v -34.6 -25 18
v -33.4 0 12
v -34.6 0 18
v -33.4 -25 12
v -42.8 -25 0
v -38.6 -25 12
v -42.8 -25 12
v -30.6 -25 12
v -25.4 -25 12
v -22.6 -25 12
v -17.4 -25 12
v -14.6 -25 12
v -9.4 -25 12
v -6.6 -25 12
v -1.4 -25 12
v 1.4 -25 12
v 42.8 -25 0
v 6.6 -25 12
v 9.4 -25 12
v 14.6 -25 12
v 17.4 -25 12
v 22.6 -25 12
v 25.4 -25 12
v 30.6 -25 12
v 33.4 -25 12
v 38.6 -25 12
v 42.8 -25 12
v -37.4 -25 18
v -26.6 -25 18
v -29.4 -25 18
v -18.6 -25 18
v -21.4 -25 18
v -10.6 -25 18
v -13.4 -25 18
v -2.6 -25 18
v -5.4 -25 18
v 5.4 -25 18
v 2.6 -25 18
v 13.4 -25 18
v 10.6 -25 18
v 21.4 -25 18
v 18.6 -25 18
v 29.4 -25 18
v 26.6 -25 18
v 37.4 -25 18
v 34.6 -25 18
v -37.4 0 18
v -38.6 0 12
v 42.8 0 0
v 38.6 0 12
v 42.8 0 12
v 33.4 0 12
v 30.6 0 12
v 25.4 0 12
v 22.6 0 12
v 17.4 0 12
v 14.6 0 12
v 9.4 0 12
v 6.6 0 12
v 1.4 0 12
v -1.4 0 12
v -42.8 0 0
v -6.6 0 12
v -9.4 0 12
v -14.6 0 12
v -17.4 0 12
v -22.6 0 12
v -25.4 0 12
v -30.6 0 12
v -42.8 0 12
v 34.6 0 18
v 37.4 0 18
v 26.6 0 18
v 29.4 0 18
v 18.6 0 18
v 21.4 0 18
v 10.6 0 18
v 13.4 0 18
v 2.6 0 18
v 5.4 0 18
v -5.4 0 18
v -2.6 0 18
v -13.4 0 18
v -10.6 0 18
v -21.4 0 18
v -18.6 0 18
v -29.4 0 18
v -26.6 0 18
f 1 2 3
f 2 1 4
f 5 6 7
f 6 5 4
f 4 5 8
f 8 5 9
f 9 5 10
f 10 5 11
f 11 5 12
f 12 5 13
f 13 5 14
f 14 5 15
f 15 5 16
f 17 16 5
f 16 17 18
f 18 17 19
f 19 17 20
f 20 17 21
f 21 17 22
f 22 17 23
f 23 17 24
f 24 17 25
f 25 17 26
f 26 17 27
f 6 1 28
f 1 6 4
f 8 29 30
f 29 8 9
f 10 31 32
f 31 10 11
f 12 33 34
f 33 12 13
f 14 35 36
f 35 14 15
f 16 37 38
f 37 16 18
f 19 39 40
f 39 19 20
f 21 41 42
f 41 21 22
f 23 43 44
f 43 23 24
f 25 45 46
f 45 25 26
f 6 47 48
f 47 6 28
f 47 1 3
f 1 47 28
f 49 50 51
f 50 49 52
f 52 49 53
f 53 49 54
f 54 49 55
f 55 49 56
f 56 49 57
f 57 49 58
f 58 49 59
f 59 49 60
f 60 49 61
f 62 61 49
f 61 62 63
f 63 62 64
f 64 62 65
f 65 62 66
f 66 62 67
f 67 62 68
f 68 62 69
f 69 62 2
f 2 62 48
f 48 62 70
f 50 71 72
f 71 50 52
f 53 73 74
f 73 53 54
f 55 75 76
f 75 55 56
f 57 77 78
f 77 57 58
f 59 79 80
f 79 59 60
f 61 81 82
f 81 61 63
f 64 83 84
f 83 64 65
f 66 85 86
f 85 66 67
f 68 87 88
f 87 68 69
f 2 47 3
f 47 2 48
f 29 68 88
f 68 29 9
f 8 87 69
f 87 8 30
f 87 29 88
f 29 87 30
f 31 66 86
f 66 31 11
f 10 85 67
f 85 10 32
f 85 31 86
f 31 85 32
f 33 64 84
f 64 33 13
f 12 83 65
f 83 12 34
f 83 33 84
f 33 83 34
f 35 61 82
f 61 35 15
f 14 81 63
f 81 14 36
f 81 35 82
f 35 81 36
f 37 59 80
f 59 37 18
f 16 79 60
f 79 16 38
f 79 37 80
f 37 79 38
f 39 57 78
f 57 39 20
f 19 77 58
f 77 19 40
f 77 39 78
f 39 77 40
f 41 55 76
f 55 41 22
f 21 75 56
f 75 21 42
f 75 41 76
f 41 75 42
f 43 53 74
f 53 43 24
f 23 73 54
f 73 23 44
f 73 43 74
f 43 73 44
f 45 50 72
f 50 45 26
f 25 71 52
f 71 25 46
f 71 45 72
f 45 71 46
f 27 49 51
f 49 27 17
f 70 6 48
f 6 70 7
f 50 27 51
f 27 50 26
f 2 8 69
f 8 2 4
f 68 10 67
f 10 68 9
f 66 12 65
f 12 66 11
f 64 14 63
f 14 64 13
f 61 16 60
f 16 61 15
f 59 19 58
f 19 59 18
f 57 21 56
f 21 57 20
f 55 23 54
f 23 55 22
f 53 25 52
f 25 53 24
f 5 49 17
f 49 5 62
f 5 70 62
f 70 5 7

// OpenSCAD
$fn = 32;

// ----------------------------------------------------------------------
// Toothed rack, 10 teeth
// 8 mm pitch, 6 mm teeth
// ----------------------------------------------------------------------

// --- parameters (mm) ---
bar_w = 25;      // bar width (Y)
seat_tol = 0.1;  // tolerance at the seating features
free_tol = 0.3;  // general tolerance on the free sizes
bar_h = 12;      // bar height (Z)
teeth = 10;      // number of teeth
pitch = 8;       // tooth pitch
tooth_h = 6;     // tooth height above the bar
root_w = 5.6;    // tooth width at the root
crest_w = 2.8;   // tooth width at the crest

// --- derived feature positions (mm) ---
span = (teeth - 1) * pitch;  // = 72   distance between the outer teeth
bar_l = span + root_w + 8;   // = 85.6   bar length: teeth plus 4 mm at each end
tooth_x = -span / 2;         // = -36   X of the first tooth
height = bar_h + tooth_h;    // = 18   overall height
feature_centers = [
  [tooth_x + 0 * pitch, -bar_w / 2],
  [tooth_x + 1 * pitch, -bar_w / 2],
  [tooth_x + 2 * pitch, -bar_w / 2],
  [tooth_x + 3 * pitch, -bar_w / 2],
  [tooth_x + 4 * pitch, -bar_w / 2],
  [tooth_x + 5 * pitch, -bar_w / 2],
  [tooth_x + 6 * pitch, -bar_w / 2],
  [tooth_x + 7 * pitch, -bar_w / 2],
  [tooth_x + 8 * pitch, -bar_w / 2],
  [tooth_x + 9 * pitch, -bar_w / 2]
];   // tooth centre line, drives the tooth loop

// bar with a rack of teeth, one extruded trapezoium per centre
module rack_tooth() {
  linear_extrude(height = bar_w)
    polygon(points = [
      [0, 0],
      [root_w, 0],
      [root_w / 2 + crest_w / 2, tooth_h + 1],
      [root_w / 2 - crest_w / 2, tooth_h + 1]
    ]);
}

union() {
  translate([-bar_l / 2, -bar_w, 0]) cube([bar_l, bar_w, bar_h]);
  for (centre = feature_centers)
    translate([centre[0] - root_w / 2, 0, bar_h - 1]) rotate([90, 0, 0]) rack_tooth();
}
